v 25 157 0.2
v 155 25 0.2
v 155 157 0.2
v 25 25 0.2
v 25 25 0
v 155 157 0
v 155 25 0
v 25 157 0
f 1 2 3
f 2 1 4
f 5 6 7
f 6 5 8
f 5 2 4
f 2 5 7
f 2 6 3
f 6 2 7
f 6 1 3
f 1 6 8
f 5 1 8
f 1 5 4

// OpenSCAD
color("black")
translate([25,25,0])
cube([130,132,.2]);
translate([0,0,.2])
linear_extrude(height=1.4)
import(file="robot.dxf");
